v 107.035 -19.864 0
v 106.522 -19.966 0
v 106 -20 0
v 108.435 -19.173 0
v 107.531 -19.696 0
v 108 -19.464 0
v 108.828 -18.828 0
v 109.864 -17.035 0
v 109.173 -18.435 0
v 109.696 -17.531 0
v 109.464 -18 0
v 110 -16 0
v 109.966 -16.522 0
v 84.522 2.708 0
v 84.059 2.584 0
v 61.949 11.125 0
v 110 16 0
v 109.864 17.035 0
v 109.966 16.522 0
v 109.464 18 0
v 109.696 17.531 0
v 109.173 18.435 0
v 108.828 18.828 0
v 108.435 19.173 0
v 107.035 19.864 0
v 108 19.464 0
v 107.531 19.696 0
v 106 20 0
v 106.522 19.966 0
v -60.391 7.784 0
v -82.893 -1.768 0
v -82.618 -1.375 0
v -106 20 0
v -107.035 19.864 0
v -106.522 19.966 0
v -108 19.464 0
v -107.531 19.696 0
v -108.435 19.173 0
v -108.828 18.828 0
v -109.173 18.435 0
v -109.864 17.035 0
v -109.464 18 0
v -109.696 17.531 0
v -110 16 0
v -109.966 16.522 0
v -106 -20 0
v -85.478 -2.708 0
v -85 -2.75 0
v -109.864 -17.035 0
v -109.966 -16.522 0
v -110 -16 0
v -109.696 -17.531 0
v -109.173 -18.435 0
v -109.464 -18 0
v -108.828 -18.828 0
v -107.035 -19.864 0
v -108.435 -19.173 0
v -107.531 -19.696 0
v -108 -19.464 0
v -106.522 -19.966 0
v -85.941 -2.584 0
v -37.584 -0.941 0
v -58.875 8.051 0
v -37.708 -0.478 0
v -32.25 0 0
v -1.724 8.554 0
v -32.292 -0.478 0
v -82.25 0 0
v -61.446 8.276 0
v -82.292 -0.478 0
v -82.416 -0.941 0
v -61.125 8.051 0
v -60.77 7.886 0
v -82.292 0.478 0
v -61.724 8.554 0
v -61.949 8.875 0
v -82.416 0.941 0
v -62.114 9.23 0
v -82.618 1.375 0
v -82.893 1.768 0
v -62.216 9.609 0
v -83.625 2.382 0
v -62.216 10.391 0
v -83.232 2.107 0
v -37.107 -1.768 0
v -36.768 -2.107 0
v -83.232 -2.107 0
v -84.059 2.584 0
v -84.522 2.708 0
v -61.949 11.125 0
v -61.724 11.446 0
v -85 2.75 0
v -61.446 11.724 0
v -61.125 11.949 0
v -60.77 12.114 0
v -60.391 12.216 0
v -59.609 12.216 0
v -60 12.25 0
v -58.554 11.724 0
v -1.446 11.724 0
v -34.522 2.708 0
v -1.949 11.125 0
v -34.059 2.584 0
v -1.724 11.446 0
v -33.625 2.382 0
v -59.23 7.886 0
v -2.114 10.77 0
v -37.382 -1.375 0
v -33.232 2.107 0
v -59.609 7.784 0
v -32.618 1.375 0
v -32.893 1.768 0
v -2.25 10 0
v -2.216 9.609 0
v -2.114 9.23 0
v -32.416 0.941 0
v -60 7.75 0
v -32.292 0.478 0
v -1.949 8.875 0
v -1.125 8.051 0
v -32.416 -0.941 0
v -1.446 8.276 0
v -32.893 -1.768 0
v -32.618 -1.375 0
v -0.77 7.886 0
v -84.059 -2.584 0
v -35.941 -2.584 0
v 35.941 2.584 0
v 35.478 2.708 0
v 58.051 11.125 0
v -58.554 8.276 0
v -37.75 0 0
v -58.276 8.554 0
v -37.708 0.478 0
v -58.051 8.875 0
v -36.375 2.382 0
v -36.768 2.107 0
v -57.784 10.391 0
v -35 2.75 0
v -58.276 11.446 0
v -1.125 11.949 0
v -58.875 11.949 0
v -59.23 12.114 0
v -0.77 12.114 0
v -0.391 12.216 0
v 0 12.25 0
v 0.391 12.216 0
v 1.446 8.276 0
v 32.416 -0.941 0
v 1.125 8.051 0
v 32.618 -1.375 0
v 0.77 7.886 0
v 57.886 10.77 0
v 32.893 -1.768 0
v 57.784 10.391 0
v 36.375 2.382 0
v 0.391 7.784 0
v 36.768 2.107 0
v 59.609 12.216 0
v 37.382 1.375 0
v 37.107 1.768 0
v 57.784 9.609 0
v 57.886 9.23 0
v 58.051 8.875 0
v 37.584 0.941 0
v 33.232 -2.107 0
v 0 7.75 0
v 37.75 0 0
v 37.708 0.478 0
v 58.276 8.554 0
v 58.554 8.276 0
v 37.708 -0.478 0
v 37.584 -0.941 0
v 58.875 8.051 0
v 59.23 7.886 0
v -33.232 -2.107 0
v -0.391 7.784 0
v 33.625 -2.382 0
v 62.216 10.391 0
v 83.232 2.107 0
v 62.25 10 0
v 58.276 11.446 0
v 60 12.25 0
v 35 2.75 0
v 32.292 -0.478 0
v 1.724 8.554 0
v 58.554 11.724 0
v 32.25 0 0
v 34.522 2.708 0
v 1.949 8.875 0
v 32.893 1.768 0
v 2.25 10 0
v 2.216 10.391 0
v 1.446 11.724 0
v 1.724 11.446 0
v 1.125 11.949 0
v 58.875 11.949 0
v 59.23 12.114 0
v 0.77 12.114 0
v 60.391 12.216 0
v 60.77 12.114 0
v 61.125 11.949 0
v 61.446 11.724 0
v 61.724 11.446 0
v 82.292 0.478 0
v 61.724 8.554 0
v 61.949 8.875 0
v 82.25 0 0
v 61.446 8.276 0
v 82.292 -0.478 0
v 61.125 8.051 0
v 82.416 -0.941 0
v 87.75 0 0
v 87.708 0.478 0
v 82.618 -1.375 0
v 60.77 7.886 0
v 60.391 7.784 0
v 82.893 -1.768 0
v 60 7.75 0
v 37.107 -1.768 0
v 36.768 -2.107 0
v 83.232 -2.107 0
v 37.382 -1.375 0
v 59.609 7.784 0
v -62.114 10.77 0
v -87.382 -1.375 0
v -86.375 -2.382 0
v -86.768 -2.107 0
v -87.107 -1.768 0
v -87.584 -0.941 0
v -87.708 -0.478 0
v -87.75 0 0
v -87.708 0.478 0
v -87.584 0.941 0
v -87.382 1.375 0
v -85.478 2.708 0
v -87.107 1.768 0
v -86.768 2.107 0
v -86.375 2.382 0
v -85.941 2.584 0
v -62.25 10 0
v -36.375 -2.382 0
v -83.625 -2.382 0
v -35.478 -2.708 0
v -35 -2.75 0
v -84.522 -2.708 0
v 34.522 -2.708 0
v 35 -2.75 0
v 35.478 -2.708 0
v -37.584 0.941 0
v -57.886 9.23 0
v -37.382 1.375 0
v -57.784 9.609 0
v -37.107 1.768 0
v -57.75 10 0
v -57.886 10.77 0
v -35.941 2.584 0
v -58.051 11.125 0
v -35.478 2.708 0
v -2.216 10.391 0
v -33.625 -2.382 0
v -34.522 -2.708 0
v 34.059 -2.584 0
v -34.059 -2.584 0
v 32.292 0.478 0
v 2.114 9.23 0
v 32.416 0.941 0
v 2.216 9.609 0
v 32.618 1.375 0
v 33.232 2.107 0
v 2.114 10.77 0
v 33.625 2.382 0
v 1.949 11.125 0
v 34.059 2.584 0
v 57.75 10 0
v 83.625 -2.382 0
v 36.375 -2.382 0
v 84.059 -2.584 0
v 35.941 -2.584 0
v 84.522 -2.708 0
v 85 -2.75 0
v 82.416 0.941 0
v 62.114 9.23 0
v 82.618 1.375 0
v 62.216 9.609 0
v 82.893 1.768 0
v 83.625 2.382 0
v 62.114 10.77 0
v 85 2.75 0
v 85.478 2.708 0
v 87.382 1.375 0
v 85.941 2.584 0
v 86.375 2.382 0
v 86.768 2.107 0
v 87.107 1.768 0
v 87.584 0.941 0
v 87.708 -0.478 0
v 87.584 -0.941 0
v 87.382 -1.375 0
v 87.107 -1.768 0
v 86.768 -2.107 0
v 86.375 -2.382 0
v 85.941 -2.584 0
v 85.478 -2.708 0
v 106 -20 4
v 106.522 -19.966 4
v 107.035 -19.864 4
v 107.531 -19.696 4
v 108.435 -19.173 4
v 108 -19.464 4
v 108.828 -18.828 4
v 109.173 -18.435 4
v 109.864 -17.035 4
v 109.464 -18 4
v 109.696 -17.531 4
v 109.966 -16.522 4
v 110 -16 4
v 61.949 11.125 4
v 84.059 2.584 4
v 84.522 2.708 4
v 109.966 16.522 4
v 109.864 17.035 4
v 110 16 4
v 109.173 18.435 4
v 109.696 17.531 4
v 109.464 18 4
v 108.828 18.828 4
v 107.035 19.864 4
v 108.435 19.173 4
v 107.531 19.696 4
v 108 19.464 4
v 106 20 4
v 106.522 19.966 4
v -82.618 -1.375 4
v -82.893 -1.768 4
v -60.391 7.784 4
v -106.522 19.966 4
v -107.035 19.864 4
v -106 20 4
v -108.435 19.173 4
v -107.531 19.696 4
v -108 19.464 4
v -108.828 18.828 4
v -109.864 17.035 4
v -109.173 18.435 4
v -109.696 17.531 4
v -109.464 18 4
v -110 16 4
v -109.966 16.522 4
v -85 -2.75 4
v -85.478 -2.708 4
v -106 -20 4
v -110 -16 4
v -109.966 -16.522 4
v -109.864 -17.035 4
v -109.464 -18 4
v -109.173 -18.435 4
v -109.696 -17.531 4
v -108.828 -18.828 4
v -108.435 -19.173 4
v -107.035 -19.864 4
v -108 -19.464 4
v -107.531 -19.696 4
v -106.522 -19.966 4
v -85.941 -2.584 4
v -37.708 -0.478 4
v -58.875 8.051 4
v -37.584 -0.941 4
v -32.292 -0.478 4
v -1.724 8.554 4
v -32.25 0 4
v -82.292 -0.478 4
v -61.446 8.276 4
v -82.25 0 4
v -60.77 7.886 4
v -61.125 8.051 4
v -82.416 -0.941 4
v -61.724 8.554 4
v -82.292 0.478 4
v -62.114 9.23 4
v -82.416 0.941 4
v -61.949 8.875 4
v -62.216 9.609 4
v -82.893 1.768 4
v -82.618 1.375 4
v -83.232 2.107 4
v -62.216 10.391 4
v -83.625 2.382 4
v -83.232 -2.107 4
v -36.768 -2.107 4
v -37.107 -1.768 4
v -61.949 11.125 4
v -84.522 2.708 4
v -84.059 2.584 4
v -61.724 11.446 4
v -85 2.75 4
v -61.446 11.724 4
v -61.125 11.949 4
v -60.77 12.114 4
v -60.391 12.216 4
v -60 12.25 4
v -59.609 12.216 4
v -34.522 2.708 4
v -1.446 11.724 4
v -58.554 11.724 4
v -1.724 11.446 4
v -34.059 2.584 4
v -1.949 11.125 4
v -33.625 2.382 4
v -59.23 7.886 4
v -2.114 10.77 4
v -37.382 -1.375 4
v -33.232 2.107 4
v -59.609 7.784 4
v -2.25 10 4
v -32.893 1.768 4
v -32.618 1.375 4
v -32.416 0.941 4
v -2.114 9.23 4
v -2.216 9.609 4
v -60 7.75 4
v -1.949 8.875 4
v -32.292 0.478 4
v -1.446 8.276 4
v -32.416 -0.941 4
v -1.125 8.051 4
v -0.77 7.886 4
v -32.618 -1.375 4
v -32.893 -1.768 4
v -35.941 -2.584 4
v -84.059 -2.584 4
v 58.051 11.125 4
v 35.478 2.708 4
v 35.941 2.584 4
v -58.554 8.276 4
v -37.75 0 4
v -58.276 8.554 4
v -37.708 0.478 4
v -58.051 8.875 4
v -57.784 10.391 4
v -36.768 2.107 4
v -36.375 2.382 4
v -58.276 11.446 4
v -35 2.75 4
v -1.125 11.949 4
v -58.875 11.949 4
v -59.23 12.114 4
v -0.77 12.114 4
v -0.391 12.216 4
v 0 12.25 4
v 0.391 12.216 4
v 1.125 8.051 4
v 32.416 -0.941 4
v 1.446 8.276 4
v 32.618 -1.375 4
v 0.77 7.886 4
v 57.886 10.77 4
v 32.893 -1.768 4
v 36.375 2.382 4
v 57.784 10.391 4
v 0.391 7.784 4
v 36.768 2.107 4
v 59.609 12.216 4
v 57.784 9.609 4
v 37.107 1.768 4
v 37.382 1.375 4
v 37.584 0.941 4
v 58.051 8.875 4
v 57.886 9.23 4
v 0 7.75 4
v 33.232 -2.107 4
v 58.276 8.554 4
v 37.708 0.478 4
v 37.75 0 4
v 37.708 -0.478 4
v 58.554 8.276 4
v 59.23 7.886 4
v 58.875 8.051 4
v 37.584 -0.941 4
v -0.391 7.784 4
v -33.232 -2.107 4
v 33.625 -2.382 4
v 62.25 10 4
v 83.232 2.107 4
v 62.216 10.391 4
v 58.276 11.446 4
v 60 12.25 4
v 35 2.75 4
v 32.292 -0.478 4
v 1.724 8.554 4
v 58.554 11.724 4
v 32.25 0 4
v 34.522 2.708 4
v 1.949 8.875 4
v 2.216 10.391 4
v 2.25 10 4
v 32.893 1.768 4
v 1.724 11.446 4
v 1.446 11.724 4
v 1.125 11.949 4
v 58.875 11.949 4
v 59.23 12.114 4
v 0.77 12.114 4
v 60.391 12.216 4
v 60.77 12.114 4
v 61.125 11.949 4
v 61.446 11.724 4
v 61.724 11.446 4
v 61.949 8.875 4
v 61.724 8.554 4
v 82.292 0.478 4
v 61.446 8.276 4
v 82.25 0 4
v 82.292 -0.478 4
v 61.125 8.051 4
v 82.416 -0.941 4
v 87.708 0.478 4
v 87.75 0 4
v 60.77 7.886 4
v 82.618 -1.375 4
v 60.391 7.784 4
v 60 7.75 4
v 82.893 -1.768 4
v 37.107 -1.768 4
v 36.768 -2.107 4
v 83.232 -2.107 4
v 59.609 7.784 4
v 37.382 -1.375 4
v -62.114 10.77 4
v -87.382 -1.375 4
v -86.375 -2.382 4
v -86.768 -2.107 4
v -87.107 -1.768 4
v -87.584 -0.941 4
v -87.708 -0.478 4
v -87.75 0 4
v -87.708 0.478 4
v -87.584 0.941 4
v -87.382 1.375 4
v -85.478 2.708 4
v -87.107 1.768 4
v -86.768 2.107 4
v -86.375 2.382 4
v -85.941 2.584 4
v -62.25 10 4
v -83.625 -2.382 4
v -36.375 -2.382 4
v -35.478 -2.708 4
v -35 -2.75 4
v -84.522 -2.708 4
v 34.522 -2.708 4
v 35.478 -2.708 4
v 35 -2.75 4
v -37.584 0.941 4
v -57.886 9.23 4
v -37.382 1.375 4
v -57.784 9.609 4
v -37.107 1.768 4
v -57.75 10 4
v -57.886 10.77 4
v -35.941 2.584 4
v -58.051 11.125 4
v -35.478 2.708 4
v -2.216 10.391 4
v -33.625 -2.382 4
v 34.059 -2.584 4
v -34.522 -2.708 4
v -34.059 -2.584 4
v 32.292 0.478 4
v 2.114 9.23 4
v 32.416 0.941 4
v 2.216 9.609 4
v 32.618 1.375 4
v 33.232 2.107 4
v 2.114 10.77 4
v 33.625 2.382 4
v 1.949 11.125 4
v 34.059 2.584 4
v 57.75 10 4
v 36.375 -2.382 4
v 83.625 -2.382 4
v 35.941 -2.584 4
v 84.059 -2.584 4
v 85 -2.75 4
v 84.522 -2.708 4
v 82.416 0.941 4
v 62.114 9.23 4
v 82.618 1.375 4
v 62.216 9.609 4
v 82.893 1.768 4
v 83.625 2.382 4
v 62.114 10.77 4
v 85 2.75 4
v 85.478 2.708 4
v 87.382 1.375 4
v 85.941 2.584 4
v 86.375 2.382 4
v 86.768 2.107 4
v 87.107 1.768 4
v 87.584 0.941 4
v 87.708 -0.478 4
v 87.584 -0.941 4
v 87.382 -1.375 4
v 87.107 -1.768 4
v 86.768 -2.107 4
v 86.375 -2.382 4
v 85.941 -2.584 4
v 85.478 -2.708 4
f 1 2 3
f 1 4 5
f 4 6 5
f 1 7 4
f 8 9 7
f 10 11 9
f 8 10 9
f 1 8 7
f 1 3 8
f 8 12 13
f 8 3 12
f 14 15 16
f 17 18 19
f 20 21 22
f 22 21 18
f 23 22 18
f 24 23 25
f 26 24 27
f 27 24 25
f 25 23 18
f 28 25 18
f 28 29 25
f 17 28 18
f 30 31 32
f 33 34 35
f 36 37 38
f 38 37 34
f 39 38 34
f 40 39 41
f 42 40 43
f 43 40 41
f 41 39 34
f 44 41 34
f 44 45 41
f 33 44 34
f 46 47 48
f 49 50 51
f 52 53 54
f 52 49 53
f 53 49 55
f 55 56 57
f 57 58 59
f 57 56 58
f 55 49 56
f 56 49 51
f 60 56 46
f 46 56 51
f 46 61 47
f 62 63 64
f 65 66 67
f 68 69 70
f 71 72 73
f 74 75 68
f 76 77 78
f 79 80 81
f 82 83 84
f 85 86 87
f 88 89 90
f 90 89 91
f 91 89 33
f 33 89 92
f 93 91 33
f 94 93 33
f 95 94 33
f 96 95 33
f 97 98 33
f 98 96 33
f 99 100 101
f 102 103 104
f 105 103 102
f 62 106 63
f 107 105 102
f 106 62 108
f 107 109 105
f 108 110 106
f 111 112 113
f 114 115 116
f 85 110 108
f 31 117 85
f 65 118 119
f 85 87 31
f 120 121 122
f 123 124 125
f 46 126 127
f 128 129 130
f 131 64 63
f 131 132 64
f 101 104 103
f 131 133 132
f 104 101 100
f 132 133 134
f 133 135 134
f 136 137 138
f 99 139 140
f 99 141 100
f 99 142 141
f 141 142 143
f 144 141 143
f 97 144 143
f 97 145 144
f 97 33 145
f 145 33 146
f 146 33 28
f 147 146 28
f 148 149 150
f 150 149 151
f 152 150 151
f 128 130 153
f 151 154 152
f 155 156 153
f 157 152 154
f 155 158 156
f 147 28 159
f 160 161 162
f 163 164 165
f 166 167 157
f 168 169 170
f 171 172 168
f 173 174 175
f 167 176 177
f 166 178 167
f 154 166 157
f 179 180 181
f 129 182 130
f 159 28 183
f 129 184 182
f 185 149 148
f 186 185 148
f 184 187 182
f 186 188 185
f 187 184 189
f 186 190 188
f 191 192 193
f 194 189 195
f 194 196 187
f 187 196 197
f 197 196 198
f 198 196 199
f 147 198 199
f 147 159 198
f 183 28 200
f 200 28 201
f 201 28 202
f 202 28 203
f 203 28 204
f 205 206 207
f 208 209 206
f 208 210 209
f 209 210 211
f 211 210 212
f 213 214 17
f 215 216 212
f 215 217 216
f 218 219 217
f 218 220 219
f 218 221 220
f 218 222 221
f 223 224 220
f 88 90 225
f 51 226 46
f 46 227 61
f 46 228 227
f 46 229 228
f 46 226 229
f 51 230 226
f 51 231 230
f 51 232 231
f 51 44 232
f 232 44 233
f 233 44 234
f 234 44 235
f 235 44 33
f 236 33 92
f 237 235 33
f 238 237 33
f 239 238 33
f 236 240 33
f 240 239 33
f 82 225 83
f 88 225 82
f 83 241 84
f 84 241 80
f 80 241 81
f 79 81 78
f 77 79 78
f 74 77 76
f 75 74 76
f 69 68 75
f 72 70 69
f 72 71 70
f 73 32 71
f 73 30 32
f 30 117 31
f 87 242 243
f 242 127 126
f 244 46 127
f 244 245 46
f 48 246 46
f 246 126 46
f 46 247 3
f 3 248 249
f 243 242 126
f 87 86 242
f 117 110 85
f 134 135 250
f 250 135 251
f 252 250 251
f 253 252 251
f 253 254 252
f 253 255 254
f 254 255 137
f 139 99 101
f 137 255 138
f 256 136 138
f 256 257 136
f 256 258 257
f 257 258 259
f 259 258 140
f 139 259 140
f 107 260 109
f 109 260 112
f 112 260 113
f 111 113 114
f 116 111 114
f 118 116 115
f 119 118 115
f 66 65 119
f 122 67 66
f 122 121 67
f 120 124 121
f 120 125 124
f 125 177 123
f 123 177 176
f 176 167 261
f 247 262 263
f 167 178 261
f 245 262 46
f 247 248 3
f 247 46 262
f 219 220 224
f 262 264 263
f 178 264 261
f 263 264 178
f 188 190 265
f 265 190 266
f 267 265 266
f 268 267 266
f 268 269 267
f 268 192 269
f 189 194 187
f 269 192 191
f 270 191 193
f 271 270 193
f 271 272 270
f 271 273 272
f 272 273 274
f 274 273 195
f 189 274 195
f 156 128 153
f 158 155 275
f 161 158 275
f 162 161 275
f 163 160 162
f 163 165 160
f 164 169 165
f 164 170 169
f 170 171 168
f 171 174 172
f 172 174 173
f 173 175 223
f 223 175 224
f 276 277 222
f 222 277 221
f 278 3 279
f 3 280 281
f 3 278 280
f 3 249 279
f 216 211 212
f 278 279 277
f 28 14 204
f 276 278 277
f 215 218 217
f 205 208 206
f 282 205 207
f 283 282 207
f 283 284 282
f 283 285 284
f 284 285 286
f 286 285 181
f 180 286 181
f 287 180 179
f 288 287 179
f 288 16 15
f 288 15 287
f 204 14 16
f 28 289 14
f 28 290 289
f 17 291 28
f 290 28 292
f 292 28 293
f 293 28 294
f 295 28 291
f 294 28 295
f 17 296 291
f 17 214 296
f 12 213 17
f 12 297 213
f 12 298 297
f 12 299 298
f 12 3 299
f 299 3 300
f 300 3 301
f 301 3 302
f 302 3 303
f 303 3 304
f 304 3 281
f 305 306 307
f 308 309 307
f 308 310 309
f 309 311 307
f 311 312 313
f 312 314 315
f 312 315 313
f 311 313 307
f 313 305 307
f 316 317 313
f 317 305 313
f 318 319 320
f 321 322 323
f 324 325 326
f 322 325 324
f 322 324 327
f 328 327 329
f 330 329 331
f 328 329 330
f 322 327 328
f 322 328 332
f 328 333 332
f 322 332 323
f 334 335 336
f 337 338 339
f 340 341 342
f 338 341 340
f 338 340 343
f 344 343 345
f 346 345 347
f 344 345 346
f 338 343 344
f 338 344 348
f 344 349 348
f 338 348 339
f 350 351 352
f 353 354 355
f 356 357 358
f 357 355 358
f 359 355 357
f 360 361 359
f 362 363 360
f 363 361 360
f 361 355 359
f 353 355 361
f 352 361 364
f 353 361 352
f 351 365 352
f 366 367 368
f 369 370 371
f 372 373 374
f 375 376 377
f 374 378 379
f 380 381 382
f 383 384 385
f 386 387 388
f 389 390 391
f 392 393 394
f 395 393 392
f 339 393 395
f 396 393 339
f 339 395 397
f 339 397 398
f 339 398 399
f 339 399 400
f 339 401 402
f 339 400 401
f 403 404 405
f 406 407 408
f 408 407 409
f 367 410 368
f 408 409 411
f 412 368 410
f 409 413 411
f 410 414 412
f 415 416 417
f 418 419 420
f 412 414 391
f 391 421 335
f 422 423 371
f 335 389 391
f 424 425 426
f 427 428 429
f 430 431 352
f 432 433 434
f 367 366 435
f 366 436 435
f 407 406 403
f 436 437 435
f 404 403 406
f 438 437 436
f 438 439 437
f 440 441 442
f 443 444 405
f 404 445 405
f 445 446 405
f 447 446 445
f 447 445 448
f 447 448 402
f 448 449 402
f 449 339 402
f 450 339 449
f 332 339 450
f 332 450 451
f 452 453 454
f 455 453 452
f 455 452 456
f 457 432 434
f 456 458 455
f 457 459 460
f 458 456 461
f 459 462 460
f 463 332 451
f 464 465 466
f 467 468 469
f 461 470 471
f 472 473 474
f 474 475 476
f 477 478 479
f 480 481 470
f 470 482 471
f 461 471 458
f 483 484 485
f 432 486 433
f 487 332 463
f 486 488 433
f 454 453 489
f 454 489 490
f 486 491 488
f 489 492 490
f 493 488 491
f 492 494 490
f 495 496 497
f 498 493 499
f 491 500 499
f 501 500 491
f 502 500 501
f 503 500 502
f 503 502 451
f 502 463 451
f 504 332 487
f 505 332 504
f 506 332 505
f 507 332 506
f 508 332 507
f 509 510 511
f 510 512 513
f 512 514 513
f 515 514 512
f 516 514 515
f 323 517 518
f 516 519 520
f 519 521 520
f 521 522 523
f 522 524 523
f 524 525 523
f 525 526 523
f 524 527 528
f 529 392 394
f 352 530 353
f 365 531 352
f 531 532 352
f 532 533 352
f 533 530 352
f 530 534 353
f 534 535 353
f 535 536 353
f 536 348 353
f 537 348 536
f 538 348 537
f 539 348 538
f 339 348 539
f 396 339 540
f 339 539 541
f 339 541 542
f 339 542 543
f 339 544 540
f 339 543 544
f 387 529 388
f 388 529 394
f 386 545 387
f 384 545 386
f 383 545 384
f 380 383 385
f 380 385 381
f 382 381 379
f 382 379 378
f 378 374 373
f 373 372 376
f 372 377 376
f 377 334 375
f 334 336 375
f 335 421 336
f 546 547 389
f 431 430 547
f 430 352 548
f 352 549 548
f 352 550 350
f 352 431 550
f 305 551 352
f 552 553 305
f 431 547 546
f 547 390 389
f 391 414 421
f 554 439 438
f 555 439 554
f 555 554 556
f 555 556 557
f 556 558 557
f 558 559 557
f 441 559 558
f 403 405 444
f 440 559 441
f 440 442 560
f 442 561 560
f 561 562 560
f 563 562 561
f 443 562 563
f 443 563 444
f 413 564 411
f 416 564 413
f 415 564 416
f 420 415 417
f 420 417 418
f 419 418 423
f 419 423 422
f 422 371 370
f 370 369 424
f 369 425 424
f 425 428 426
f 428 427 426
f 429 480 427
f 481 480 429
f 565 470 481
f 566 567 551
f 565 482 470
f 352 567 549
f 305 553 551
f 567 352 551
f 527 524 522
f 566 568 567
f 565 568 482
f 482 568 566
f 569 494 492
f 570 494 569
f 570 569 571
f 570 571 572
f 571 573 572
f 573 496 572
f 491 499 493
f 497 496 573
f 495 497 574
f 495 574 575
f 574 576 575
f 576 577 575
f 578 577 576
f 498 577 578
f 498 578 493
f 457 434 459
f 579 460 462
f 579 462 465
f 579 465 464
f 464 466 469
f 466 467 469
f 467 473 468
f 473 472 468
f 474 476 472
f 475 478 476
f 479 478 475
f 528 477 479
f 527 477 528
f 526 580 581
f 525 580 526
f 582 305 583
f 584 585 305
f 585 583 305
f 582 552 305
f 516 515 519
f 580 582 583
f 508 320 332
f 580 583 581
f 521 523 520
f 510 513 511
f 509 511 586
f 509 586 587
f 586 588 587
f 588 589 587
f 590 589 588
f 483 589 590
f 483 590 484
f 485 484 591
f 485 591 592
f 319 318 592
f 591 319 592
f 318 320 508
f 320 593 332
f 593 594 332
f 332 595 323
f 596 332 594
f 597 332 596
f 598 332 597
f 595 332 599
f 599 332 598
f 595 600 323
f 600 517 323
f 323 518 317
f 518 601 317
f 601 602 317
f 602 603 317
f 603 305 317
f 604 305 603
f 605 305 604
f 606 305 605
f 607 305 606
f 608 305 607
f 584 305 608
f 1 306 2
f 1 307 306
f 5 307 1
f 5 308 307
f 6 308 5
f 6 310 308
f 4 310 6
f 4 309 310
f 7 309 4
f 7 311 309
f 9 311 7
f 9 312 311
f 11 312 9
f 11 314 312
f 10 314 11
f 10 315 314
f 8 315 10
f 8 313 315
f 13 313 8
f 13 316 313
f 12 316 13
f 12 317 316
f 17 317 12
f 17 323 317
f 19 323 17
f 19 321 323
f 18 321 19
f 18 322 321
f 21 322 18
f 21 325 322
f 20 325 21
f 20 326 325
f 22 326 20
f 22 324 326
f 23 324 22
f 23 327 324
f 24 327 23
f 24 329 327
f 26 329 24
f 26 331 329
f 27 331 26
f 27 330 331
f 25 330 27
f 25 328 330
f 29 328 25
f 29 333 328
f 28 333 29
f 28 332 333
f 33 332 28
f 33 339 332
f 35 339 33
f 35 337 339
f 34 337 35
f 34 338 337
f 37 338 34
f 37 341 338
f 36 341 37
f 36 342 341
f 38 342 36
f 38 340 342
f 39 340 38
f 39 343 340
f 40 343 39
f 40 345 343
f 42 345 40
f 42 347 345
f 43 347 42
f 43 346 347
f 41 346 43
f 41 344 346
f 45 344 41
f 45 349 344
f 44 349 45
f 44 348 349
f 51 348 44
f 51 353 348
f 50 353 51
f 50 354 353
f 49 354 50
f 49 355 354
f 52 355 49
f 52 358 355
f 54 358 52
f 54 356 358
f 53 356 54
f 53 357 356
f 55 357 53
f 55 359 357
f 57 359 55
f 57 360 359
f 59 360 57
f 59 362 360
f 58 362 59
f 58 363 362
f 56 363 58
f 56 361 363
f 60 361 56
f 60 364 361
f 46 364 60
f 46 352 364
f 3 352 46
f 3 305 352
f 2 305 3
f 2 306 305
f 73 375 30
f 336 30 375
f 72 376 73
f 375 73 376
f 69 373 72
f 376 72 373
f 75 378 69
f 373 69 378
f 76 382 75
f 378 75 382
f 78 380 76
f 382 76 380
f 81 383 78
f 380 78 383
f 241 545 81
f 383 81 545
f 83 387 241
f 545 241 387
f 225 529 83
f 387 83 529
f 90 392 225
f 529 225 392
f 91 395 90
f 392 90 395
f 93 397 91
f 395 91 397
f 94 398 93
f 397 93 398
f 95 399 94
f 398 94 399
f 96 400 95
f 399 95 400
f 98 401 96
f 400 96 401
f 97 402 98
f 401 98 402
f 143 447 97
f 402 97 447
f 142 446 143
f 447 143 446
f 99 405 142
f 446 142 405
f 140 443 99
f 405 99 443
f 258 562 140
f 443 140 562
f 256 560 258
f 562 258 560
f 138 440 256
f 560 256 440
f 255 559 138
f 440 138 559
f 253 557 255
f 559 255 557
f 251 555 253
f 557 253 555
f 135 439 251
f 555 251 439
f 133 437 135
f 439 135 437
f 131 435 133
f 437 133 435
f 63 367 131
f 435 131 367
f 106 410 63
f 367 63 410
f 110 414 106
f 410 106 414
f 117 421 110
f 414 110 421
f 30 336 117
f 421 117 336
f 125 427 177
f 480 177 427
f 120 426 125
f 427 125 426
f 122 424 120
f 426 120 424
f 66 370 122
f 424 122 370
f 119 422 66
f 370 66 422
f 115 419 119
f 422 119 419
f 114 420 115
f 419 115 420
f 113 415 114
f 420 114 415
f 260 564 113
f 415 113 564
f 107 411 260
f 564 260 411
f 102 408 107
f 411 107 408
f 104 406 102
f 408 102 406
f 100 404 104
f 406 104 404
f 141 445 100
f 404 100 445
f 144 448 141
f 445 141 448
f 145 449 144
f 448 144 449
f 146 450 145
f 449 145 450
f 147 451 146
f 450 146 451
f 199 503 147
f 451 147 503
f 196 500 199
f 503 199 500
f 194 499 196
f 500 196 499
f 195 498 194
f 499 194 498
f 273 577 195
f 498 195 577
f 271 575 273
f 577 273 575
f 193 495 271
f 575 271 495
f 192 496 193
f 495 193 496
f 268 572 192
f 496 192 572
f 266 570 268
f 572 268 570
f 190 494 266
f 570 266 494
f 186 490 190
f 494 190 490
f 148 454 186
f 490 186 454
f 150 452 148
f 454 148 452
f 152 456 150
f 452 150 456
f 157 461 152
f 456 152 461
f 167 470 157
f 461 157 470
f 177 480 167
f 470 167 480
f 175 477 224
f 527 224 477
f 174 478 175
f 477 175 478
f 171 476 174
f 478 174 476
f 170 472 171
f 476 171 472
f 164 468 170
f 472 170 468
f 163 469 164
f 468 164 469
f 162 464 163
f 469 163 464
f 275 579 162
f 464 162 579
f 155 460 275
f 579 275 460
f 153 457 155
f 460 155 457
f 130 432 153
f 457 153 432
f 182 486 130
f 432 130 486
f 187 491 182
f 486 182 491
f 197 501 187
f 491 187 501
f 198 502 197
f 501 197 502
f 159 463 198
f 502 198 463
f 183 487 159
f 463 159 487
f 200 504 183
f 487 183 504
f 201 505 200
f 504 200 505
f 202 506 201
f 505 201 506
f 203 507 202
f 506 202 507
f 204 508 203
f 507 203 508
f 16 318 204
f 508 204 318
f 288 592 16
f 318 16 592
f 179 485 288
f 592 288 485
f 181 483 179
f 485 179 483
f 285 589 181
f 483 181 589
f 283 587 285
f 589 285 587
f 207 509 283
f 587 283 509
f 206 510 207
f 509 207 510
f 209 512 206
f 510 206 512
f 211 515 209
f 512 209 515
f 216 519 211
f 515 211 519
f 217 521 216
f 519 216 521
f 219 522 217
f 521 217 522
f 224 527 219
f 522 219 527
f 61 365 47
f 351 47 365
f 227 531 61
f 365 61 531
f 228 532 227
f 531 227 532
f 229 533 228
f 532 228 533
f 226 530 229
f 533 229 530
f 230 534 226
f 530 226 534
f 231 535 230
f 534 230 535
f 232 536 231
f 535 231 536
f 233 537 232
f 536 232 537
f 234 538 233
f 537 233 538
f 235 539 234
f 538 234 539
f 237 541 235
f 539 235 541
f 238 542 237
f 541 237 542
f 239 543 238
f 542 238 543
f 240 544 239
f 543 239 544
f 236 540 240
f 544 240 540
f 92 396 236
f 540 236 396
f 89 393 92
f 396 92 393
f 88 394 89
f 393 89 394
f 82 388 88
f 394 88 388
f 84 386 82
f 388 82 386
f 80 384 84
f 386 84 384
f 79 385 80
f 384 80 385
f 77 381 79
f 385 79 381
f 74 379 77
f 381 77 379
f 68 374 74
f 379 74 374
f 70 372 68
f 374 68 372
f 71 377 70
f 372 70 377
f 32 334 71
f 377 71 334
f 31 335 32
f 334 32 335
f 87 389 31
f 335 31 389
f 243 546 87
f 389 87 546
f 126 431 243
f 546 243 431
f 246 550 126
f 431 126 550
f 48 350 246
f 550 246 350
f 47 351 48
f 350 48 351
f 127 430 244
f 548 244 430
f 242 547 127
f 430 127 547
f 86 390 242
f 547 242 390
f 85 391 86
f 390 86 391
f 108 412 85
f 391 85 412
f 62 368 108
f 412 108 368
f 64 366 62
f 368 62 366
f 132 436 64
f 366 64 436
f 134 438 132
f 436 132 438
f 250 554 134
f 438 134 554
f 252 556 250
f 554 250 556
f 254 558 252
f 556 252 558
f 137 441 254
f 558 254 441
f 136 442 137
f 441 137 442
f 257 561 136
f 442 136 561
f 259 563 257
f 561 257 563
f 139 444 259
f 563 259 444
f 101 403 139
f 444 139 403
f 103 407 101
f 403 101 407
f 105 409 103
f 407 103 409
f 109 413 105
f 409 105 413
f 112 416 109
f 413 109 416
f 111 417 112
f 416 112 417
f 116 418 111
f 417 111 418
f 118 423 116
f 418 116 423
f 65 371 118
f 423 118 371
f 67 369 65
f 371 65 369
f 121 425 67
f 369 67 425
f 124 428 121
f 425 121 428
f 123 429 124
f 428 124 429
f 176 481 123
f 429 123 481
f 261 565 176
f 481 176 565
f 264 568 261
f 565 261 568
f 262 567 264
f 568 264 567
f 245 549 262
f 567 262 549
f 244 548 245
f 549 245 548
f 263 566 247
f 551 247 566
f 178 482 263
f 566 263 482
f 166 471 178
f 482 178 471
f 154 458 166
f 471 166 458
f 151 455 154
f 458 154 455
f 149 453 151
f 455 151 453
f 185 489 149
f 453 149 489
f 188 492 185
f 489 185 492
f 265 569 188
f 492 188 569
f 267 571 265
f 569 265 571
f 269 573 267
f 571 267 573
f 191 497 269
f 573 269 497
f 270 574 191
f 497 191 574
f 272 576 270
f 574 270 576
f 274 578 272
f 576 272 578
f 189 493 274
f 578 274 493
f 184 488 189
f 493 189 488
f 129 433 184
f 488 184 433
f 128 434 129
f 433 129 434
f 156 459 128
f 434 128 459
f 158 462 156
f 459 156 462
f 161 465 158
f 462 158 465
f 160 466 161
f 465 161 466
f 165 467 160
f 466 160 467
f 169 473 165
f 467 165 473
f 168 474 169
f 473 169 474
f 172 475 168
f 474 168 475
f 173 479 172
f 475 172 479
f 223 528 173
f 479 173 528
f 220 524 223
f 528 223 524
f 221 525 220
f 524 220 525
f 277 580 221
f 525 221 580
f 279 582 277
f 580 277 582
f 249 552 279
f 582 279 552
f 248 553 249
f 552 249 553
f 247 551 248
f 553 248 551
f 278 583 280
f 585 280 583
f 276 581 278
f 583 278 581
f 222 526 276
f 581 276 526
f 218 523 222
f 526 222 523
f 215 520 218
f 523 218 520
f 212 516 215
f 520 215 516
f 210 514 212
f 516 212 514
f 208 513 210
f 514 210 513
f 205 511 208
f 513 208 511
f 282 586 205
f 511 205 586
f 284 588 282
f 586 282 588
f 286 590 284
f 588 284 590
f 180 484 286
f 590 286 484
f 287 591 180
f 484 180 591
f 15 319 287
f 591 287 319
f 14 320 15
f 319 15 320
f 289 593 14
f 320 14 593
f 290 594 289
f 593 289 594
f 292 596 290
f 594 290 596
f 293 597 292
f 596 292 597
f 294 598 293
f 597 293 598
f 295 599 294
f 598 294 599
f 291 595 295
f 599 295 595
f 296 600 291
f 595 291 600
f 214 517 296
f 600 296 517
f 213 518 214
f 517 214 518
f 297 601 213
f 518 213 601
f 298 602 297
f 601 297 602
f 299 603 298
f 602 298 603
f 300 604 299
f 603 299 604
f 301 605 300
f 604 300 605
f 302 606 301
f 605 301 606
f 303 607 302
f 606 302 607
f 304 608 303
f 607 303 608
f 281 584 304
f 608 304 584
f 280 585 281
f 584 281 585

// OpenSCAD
// Guard Bracket v1
main_w = 220;
main_h = 40;
main_t = 4;
corner_r = 4;
mount_hole_d = 5.5;
guard_hole_d = 4.5;

module rounded_rect_2d(w,h,r){
  hull(){
    translate([-(w/2-r),-(h/2-r)]) circle(r=r,$fn=48);
    translate([ (w/2-r),-(h/2-r)]) circle(r=r,$fn=48);
    translate([-(w/2-r), (h/2-r)]) circle(r=r,$fn=48);
    translate([ (w/2-r), (h/2-r)]) circle(r=r,$fn=48);
  }
}

linear_extrude(height=main_t)
  difference(){
    rounded_rect_2d(main_w, main_h, corner_r);
    for (x=[-85,-35,35,85]) translate([x,0]) circle(d=mount_hole_d,$fn=36);
    for (x=[-60,0,60]) translate([x,10]) circle(d=guard_hole_d,$fn=36);
  }
